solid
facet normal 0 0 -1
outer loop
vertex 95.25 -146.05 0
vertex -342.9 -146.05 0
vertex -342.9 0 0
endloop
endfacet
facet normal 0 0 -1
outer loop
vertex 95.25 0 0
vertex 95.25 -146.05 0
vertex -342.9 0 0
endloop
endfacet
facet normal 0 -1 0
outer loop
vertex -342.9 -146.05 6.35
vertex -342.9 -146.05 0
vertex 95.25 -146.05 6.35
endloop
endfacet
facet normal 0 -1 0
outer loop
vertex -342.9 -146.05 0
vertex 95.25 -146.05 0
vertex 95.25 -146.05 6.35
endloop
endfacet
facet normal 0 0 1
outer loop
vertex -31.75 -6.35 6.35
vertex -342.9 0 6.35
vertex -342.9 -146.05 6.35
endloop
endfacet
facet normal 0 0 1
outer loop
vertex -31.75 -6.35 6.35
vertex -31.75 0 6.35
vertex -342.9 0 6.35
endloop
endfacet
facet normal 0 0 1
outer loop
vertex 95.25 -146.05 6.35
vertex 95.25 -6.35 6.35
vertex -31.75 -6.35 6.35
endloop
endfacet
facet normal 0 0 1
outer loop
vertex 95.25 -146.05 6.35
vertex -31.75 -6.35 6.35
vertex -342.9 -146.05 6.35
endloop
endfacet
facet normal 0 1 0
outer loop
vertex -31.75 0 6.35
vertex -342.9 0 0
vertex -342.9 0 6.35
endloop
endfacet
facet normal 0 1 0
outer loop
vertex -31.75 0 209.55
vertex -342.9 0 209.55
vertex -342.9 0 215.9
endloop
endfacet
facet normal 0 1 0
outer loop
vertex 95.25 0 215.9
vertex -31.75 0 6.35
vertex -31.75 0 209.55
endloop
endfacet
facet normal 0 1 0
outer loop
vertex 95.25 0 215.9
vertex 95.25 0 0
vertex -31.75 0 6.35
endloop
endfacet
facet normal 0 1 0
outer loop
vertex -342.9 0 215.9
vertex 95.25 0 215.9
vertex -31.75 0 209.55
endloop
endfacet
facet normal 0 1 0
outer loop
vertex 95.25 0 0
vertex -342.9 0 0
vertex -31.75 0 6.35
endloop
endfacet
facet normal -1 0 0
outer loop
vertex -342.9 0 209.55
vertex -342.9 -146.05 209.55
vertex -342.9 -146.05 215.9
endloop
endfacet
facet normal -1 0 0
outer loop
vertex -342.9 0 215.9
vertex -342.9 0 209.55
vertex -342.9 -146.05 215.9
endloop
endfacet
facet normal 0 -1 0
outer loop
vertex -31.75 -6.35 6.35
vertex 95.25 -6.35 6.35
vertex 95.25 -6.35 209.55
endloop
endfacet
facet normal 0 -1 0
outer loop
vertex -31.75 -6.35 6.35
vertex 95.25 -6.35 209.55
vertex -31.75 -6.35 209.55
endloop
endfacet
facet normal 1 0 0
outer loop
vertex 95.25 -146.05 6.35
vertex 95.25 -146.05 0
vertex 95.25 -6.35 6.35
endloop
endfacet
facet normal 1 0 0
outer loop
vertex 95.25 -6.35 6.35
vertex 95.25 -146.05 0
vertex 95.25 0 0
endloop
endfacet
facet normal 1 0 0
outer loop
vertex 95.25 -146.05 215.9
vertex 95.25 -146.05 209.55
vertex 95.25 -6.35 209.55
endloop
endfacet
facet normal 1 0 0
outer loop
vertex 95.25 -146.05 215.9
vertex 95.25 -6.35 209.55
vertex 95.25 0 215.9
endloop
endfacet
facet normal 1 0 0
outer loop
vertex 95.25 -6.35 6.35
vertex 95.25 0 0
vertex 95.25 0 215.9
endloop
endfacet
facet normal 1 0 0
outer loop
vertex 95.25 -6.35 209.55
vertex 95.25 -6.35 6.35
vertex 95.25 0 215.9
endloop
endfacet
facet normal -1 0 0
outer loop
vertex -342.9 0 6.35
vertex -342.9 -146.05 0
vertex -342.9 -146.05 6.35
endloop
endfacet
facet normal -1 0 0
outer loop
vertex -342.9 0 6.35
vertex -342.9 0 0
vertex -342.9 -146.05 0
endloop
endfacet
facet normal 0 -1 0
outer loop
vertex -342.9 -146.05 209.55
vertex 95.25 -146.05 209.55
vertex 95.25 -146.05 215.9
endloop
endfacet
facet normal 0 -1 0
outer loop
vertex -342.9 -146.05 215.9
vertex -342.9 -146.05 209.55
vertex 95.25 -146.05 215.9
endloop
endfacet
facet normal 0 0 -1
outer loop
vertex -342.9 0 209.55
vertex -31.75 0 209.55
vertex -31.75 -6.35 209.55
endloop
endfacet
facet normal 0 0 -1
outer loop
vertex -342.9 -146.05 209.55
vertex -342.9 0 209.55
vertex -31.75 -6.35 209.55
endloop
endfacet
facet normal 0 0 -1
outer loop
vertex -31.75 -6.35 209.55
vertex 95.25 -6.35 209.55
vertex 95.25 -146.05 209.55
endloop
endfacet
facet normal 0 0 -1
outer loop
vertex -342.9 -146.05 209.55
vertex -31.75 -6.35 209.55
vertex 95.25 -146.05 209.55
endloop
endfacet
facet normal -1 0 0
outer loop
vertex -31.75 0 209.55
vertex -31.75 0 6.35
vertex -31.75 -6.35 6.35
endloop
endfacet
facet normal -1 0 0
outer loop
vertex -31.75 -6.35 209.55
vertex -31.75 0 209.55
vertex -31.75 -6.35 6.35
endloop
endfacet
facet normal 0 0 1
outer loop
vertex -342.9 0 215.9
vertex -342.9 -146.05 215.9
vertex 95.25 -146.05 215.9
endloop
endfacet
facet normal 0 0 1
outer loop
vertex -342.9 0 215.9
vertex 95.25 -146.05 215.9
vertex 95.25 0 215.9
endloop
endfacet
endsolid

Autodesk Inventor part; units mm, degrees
ref_plane "YZ Plane" through (0, 0, 0) normal (1, 0, 0) x (0, 1, 0)
ref_plane "XZ Plane" through (0, 0, 0) normal (0, 1, 0) x (-1, 0, 0)
ref_plane "XY Plane" through (0, 0, 0) normal (0, 0, 1) x (1, 0, 0)
sketch "Sketch1" plane through (0, 0, 0) normal (0, 0, 1) x (1, 0, 0)
  line L0 (0, 0) -> (95.25, 0)
  line L1 (95.25, 0) -> (95.25, -146.05)
  line L2 (95.25, -146.05) -> (0, -146.05)
  line L3 (0, -146.05) -> (0, 0)
  dimension "d0" = 95.25
  dimension "d1" = 146.05
extrude "Extrusion1" add sketch "Sketch1" along normal blind 6.35
sketch "Sketch2" plane through (0, 0, 6.35) normal (0, 0, 1) x (1, 0, 0)
  line L0 (95.25, 0) -> (0, 0) projected
  line L1 (95.25, 0) -> (-31.75, 0)
  line L2 (-31.75, 0) -> (-31.75, -6.35)
  line L3 (-31.75, -6.35) -> (95.25, -6.35)
  line L4 (95.25, -146.05) -> (95.25, 0) projected
  line L5 (95.25, -6.35) -> (95.25, 0)
  dimension "d4" = 127
  dimension "d5" = 6.35
extrude "Extrusion2" add sketch "Sketch2" along normal blind 203.2
sketch "Sketch3" plane through (0, 0, 209.55) normal (0, 0, 1) x (1, 0, 0)
  line L0 (0, 0) -> (95.25, 0) projected
  line L1 (95.25, -146.05) -> (95.25, -6.35) projected
  line L2 (0, 0) -> (95.25, 0)
  line L3 (95.25, 0) -> (95.25, -6.35)
  line L4 (95.25, -6.35) -> (0, -6.35)
  line L5 (0, -6.35) -> (0, 0)
extrude "Extrusion3" add sketch "Sketch3" along normal blind 6.35
sketch "Sketch4" plane through (-31.75, -6.35, 6.35) normal (0, -1, 0) x (1, 0, 0)
  line L0 (0, 203.2) -> (31.75, 203.2) projected
  line L1 (31.75, 209.55) -> (127, 209.55) projected
  line L2 (31.75, 203.2) -> (127, 203.2)
  line L3 (127, 203.2) -> (127, 209.55)
  line L4 (127, 209.55) -> (31.75, 209.55)
  line L5 (31.75, 209.55) -> (31.75, 203.2)
  point P0 (31.75, -6.35)
extrude "Extrusion4" add sketch "Sketch4" along normal blind 139.7
sketch "Sketch5" plane through (0, -146.05, 0) normal (-1, 0, 0) x (0, 0, 1)
  line L0 (0, 146.05) -> (215.9, 146.05) projected
  line L1 (0, 0) -> (6.35, 0) projected
  line L2 (0, 146.05) -> (6.35, 146.05)
  line L3 (6.35, 146.05) -> (6.35, 0)
  line L4 (6.35, 0) -> (0, 0)
  line L5 (0, 0) -> (0, 146.05)
extrude "Extrusion5" add sketch "Sketch5" along normal blind 342.9
sketch "Sketch6" plane through (0, 0, 209.55) normal (-1, 0, 0) x (0, 0, 1)
  line L0 (-209.55, 0) -> (6.35, 0) projected
  line L1 (0, -6.35) -> (0, -146.05) projected
  line L2 (6.35, 0) -> (0, 0)
  line L3 (0, 0) -> (0, -146.05)
  line L4 (0, -146.05) -> (6.35, -146.05)
  line L5 (6.35, -146.05) -> (6.35, 0)
extrude "Extrusion6" add sketch "Sketch6" along normal blind 342.9
properties part number "Gen2Plate"
